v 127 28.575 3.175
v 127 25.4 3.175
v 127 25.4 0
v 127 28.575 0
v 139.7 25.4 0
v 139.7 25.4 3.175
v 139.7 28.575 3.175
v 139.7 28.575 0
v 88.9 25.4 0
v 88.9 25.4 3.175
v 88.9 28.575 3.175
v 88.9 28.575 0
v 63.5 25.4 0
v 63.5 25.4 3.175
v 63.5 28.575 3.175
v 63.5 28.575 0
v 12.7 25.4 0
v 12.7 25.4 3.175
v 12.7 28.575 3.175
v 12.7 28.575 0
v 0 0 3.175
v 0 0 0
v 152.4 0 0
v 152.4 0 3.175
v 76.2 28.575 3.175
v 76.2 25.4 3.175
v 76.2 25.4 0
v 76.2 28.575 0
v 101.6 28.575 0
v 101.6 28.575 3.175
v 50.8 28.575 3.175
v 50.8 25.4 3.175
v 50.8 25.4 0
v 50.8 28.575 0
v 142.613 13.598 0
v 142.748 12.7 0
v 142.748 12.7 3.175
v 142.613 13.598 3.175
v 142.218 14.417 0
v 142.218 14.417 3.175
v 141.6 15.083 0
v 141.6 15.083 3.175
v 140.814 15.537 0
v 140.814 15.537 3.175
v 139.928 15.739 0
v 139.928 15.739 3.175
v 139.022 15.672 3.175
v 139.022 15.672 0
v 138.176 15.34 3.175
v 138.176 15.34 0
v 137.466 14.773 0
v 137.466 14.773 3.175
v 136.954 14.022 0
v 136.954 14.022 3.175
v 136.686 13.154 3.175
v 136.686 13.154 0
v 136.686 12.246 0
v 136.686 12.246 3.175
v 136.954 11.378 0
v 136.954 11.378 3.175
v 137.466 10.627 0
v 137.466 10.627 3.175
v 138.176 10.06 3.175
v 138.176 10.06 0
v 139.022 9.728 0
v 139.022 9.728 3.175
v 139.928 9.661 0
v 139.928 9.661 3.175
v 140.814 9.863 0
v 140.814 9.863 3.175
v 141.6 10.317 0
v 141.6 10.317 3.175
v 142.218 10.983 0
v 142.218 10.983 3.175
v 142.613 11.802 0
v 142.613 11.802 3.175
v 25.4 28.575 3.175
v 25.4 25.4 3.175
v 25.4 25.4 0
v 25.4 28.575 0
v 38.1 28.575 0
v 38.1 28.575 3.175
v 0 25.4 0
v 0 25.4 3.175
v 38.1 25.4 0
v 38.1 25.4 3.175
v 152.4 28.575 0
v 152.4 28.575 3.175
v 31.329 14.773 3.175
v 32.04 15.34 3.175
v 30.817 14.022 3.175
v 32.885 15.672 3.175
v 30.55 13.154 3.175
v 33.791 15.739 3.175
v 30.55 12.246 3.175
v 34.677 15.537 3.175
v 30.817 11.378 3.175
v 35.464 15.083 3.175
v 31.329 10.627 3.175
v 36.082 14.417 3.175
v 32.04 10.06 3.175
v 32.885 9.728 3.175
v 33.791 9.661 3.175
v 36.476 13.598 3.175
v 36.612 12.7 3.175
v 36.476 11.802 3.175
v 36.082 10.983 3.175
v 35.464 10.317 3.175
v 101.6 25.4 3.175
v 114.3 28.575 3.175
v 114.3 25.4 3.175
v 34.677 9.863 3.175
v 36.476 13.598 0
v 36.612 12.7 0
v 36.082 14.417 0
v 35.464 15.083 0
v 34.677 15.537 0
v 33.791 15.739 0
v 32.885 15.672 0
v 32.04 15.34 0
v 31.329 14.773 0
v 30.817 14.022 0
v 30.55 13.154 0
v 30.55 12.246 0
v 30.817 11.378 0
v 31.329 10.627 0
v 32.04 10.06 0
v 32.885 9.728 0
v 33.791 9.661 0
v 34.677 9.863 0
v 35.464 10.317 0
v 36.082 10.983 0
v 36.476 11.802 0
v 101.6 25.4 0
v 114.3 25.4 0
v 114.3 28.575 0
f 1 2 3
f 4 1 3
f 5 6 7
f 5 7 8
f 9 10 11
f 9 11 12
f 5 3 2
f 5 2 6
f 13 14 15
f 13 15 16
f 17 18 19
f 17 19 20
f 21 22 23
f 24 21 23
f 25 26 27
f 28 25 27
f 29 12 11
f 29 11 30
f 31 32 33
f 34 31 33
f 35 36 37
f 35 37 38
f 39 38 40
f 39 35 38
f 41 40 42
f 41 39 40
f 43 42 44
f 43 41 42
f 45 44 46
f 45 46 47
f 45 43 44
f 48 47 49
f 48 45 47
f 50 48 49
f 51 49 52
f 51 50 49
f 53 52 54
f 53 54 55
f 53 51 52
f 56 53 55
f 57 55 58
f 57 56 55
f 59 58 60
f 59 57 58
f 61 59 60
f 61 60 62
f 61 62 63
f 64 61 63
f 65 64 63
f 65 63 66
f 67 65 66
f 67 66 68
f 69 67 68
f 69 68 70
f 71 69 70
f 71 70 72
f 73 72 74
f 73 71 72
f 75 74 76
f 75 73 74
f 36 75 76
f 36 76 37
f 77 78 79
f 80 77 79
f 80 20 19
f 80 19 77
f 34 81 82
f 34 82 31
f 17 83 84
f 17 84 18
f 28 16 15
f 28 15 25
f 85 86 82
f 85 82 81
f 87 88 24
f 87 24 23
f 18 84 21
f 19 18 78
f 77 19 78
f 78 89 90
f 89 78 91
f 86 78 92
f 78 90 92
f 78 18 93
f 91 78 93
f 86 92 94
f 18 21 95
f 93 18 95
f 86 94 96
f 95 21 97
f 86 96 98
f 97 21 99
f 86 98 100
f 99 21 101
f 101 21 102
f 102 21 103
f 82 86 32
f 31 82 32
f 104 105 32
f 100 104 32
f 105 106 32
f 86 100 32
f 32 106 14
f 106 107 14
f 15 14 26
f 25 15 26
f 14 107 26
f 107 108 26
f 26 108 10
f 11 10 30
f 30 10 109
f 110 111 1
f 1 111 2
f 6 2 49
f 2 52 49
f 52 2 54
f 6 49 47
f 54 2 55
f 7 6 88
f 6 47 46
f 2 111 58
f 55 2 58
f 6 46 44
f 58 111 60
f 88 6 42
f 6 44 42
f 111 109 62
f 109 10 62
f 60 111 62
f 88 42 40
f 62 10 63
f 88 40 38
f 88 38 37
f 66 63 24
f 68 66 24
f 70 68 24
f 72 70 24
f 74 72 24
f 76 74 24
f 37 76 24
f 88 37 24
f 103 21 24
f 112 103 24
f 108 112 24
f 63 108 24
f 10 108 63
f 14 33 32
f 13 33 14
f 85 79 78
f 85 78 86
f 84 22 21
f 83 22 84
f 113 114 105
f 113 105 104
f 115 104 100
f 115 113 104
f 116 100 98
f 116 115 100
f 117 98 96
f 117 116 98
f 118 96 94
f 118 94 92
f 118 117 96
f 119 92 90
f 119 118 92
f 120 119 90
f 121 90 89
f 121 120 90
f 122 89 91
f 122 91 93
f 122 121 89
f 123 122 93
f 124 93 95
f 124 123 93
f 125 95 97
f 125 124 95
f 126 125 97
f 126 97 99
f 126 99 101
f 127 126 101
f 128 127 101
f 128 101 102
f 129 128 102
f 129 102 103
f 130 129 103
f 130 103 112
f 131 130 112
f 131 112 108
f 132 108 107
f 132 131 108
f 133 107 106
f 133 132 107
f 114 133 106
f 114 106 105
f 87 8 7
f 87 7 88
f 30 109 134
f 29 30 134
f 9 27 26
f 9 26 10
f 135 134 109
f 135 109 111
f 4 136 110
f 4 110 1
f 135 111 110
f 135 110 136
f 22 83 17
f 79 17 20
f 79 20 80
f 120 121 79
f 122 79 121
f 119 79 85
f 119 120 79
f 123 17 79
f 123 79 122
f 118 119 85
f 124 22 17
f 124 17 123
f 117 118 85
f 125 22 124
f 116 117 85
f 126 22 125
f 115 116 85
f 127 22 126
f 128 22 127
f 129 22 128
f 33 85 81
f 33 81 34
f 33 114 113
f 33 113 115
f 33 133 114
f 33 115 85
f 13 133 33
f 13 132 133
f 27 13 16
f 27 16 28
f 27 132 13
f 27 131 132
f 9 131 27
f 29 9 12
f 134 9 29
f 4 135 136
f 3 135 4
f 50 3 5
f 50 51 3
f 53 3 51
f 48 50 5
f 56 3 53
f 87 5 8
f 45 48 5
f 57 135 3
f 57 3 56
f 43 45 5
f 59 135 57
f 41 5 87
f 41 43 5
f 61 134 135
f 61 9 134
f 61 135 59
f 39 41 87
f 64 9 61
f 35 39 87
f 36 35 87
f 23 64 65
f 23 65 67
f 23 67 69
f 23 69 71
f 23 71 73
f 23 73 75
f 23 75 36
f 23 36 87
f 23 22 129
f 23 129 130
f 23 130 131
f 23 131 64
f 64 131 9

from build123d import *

# Parameters (mm, degrees)
SKETCH1_W           = 152.4
SKETCH1_H           = 25.4
SKETCH1_R           = 3.048
BOSS_EXTRUDE1_DEPTH = 3.175
SKETCH3_W           = 12.7
SKETCH3_H           = 3.175
BOSS_EXTRUDE3_DEPTH = 3.175


with BuildPart() as part:
    # Sketch1 → Boss-Extrude1 (new body)
    with BuildSketch(Plane.XY):
        with Locations((76.2, 12.7)):
            Rectangle(SKETCH1_W, SKETCH1_H)
        with Locations((139.7, 12.7)):
            Circle(SKETCH1_R, mode=Mode.SUBTRACT)
        with Locations((33.56356, 12.7)):
            Circle(SKETCH1_R, mode=Mode.SUBTRACT)
    extrude(amount=BOSS_EXTRUDE1_DEPTH)

    # Sketch3 → Boss-Extrude3 (add)
    with BuildSketch(Plane(origin=(0, 25.4, 0), x_dir=(1, 0, 0), z_dir=(0, 1, 0))):
        with Locations((146.05, -1.5875)):
            Rectangle(SKETCH3_W, SKETCH3_H)
        with Locations((120.65, -1.5875)):
            Rectangle(SKETCH3_W, SKETCH3_H)
        with Locations((95.25, -1.5875)):
            Rectangle(SKETCH3_W, SKETCH3_H)
        with Locations((69.85, -1.5875)):
            Rectangle(SKETCH3_W, SKETCH3_H)
        with Locations((44.45, -1.5875)):
            Rectangle(SKETCH3_W, SKETCH3_H)
        with Locations((19.05, -1.5875)):
            Rectangle(SKETCH3_W, SKETCH3_H)
    extrude(amount=BOSS_EXTRUDE3_DEPTH)


solid = part.part
